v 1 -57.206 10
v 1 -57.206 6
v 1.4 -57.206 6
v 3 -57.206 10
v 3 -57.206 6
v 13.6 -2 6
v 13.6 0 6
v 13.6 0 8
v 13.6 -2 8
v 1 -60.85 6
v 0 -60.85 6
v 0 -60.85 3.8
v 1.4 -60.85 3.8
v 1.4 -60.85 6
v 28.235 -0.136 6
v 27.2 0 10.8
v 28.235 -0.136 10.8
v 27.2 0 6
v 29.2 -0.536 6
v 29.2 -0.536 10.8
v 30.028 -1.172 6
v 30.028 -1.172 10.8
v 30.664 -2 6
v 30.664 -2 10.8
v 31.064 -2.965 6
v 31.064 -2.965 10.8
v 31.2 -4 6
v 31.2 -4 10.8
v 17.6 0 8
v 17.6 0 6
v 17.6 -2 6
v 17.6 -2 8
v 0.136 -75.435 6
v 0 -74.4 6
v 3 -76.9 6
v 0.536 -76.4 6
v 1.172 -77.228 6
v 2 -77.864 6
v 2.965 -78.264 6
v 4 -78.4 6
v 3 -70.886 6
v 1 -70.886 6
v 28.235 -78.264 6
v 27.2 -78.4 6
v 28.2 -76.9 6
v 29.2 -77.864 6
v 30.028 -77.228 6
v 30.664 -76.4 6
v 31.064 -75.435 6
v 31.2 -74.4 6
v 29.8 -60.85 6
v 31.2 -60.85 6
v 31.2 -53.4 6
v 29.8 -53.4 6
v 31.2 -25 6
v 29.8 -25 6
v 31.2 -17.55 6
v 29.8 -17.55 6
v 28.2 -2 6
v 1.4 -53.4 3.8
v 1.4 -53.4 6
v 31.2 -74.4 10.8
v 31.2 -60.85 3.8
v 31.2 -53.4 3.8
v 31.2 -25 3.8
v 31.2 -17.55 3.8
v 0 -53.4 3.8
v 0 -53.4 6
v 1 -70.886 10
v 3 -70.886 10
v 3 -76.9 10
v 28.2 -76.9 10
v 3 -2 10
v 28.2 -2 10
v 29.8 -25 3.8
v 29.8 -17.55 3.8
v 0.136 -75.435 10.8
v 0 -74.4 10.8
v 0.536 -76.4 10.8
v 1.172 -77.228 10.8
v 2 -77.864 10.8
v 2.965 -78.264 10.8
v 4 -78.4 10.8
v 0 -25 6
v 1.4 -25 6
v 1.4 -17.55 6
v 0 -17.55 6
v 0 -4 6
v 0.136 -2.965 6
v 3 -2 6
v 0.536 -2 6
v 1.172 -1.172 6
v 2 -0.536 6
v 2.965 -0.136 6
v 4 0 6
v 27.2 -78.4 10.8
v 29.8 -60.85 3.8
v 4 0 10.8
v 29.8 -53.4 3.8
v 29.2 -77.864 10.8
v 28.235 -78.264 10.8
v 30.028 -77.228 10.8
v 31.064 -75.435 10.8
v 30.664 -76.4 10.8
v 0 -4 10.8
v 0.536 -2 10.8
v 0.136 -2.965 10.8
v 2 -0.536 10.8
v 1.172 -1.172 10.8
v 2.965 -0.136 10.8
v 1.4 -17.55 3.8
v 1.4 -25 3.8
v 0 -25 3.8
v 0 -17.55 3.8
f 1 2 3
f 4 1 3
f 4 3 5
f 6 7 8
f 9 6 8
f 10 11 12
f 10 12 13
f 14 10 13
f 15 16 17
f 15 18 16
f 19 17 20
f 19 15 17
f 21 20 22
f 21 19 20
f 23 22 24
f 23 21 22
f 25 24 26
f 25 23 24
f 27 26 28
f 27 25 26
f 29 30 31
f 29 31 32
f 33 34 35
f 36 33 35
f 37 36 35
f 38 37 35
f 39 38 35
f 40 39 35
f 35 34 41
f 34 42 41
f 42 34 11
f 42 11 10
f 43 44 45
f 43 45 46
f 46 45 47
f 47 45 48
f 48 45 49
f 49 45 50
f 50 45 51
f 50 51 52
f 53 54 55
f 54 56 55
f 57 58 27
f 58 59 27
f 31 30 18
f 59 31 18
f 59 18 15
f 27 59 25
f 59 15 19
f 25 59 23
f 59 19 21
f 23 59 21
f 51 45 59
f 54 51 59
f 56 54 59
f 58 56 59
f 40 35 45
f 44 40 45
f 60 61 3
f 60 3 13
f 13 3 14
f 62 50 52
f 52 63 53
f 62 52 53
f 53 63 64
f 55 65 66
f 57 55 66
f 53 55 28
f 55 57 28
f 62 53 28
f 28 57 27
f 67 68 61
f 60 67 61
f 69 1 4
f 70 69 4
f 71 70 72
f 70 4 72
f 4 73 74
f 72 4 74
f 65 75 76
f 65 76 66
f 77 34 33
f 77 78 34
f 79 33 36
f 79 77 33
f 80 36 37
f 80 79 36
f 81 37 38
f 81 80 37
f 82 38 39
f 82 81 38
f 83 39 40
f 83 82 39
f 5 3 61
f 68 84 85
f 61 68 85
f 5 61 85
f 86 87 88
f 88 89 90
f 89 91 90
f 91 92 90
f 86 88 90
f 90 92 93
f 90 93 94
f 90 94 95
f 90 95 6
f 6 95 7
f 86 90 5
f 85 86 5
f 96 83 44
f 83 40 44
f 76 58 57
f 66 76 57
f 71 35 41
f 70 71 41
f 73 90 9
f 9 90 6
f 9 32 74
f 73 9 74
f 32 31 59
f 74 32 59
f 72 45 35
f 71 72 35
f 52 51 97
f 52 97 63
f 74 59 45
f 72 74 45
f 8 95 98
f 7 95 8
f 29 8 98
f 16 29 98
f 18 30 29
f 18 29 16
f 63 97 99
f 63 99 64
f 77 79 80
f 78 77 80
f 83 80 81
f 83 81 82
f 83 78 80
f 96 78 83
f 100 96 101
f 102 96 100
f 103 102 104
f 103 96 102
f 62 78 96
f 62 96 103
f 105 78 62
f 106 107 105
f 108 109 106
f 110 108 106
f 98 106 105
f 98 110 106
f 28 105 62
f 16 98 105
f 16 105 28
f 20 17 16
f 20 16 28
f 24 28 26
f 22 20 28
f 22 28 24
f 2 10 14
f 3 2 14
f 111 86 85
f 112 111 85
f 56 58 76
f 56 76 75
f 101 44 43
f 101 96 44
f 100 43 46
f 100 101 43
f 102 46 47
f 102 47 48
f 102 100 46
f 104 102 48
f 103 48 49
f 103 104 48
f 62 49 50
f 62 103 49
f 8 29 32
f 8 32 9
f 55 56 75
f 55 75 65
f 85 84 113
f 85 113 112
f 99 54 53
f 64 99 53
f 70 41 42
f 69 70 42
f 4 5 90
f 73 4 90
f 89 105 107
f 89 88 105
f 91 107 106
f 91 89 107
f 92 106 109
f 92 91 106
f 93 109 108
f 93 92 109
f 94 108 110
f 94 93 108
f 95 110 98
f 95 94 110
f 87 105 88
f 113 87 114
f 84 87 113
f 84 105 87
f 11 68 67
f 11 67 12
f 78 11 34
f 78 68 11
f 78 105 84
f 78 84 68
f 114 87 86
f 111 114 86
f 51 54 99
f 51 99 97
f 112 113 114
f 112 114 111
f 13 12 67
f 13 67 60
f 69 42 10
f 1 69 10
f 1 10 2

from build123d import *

# Parameters (mm, degrees)
SKETCH001_W     = 31.2
SKETCH001_H     = 78.4
PAD001_DEPTH    = 4
SKETCH002_W     = 31.2
SKETCH002_H     = 78.4
PAD002_DEPTH    = 0.8
SKETCH006_W     = 4
SKETCH006_H     = 2
POCKET001_DEPTH = 5
SKETCH009_W     = 1.4
SKETCH009_H     = 7.45
PAD006_DEPTH    = 2.2
FILLET001_R     = 4


with BuildPart() as part:
    # Sketch001 → Pad001 (new body)
    with BuildSketch(Plane.XY):
        with Locations((15.6, -39.2)):
            Rectangle(SKETCH001_W, SKETCH001_H)
        Polygon((3, -2), (28.2, -2), (28.2, -76.9), (3, -76.9), (3, -70.886093), (1, -70.886093), (1, -57.206394), (3, -57.206394), align=None, mode=Mode.SUBTRACT)
    extrude(amount=PAD001_DEPTH)

    # Sketch002 (on Face14 of Pad001) → Pad002 (join)
    with BuildSketch(Plane.XY.offset(4)):
        with Locations((15.6, -39.2)):
            Rectangle(SKETCH002_W, SKETCH002_H)
    extrude(amount=PAD002_DEPTH)

    # Sketch006 (on Face1 of Pad002) → Pocket001 (cut)
    with BuildSketch(Plane(origin=(0, 0, 0), x_dir=(-1, 0, 0), z_dir=(0, 1, 0))):
        with Locations((-15.6, 1)):
            Rectangle(SKETCH006_W, SKETCH006_H)
    extrude(amount=-POCKET001_DEPTH, mode=Mode.SUBTRACT)

    # Sketch009 (on Face4 of Pad002) → Pad006 (join)
    with BuildSketch(Plane(origin=(0, 0, 0), x_dir=(1, 0, 0), z_dir=(0, 0, -1))):
        with Locations((0.7, 57.125)):
            Rectangle(SKETCH009_W, SKETCH009_H)
        with Locations((0.7, 21.275)):
            Rectangle(SKETCH009_W, SKETCH009_H)
        with Locations((30.5, 21.275)):
            Rectangle(SKETCH009_W, SKETCH009_H)
        with Locations((30.5, 57.125)):
            Rectangle(SKETCH009_W, SKETCH009_H)
    extrude(amount=PAD006_DEPTH)

    # Fillet001
    fillet001_edges = [part.edges().sort_by_distance(p)[0] for p in [
        (0, -78.4, 2),
        (0, 0, 2),
        (31.2, -78.4, 2),
        (31.2, 0, 2),
    ]]
    fillet(fillet001_edges, radius=FILLET001_R)


with BuildPart() as part_1:
    # Body001 placement: moved
    add(part.part.moved(Location((0, 0, 6))))


solid = part_1.part
